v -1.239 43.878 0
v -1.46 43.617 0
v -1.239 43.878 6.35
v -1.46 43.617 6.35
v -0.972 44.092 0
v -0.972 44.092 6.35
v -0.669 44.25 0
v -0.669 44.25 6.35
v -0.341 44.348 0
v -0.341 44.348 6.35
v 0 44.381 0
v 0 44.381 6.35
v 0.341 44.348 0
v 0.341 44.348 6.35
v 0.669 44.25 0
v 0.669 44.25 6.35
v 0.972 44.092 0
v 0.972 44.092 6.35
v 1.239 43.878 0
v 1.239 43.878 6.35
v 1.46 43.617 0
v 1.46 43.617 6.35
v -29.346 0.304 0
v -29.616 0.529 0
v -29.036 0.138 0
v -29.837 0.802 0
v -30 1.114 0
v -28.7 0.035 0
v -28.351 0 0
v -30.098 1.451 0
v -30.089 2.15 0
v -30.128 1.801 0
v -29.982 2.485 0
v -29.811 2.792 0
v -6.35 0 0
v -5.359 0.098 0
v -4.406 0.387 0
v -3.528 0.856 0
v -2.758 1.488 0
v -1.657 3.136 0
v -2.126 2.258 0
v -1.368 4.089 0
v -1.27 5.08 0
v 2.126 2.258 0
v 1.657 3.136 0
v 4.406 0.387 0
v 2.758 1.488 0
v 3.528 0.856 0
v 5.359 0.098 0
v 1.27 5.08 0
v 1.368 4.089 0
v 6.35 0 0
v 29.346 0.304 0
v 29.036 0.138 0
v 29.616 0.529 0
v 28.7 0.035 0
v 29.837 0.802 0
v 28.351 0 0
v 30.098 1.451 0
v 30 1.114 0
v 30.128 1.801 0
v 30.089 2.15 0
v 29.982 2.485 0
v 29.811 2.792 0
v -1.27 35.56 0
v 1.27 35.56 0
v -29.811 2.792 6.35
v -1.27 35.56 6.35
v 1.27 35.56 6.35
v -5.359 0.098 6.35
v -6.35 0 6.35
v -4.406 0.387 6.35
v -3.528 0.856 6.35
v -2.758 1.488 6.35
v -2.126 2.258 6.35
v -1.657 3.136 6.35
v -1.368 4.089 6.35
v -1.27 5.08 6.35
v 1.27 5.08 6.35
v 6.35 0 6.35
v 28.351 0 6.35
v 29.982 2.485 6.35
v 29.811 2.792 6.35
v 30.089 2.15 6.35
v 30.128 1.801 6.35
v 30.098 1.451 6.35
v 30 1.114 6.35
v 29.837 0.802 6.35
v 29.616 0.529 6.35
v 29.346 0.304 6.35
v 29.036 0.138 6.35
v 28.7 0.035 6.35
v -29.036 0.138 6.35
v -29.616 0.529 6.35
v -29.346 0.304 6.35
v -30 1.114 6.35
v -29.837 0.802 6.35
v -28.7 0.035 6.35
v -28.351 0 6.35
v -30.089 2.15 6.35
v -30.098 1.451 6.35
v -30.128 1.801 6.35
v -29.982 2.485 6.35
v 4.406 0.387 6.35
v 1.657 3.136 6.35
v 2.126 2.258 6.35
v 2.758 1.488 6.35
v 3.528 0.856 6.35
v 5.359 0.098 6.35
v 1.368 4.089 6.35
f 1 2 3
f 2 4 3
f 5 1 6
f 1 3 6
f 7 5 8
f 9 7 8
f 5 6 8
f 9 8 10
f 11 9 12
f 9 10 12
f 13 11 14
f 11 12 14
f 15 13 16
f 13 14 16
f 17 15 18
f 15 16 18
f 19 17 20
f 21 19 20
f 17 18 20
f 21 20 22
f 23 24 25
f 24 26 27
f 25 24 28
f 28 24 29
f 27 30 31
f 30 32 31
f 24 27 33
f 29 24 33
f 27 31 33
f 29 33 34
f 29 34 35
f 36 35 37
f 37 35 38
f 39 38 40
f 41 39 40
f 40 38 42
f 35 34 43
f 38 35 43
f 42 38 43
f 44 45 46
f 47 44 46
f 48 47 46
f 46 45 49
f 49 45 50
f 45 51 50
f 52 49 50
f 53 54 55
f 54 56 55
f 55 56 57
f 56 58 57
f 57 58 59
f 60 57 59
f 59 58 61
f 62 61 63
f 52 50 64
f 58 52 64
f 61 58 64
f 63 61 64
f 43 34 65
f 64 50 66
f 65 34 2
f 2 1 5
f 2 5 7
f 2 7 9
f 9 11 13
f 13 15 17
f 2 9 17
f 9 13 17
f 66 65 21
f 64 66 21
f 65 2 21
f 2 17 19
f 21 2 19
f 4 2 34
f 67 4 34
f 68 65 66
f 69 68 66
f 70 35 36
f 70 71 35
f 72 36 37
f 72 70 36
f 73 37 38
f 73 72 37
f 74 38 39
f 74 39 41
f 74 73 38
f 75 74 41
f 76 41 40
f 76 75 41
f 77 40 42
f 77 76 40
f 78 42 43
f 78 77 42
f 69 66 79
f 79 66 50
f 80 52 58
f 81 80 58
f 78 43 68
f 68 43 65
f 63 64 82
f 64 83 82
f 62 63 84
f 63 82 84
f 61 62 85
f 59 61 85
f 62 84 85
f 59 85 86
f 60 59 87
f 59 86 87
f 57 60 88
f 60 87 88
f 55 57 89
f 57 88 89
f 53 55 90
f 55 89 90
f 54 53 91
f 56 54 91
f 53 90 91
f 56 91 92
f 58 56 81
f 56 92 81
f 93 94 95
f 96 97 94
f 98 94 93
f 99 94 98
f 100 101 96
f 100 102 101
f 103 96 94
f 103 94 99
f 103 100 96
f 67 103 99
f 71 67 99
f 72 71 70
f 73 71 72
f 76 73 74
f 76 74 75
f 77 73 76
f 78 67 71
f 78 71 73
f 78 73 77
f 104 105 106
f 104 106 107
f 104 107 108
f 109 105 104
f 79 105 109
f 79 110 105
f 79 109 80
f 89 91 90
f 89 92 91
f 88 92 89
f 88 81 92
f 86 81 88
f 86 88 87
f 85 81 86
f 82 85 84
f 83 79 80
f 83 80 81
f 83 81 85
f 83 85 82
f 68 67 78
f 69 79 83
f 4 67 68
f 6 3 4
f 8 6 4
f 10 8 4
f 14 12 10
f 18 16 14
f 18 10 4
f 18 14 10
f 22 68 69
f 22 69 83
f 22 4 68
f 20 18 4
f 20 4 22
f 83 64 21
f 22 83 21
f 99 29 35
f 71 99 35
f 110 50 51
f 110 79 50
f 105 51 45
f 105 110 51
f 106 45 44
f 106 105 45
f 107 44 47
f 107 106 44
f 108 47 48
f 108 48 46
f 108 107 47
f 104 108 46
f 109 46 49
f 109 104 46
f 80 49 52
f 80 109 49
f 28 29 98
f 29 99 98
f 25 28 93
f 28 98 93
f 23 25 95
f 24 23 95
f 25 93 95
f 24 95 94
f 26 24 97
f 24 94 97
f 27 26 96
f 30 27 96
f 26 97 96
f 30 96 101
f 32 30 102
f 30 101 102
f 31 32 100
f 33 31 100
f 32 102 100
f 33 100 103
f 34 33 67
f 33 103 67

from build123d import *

# Parameters (mm, degrees)
F1_DEPTH = 6.35
F2_R     = 5.08
F3_R     = 1.778


with BuildPart() as f1:
    # F0 (on Top) → F1 (new body)
    with BuildSketch(Plane.XY):
        Polygon((31.75, 0), (0, 45.72), (-31.75, 0), (-1.27, 0), (-1.27, 35.56), (1.27, 35.56), (1.27, 0), align=None)
    extrude(amount=F1_DEPTH)

    # F2
    f2_edges = [f1.edges().sort_by_distance(p)[0] for p in [
        (-1.27, 0, 3.175),
        (1.27, 0, 3.175),
    ]]
    fillet(f2_edges, radius=F2_R)

    # F3
    f3_edges = [f1.edges().sort_by_distance(p)[0] for p in [
        (0, 45.72, 3.175),
        (31.75, 0, 3.175),
        (-31.75, 0, 3.175),
    ]]
    fillet(f3_edges, radius=F3_R)


solid = f1.part
